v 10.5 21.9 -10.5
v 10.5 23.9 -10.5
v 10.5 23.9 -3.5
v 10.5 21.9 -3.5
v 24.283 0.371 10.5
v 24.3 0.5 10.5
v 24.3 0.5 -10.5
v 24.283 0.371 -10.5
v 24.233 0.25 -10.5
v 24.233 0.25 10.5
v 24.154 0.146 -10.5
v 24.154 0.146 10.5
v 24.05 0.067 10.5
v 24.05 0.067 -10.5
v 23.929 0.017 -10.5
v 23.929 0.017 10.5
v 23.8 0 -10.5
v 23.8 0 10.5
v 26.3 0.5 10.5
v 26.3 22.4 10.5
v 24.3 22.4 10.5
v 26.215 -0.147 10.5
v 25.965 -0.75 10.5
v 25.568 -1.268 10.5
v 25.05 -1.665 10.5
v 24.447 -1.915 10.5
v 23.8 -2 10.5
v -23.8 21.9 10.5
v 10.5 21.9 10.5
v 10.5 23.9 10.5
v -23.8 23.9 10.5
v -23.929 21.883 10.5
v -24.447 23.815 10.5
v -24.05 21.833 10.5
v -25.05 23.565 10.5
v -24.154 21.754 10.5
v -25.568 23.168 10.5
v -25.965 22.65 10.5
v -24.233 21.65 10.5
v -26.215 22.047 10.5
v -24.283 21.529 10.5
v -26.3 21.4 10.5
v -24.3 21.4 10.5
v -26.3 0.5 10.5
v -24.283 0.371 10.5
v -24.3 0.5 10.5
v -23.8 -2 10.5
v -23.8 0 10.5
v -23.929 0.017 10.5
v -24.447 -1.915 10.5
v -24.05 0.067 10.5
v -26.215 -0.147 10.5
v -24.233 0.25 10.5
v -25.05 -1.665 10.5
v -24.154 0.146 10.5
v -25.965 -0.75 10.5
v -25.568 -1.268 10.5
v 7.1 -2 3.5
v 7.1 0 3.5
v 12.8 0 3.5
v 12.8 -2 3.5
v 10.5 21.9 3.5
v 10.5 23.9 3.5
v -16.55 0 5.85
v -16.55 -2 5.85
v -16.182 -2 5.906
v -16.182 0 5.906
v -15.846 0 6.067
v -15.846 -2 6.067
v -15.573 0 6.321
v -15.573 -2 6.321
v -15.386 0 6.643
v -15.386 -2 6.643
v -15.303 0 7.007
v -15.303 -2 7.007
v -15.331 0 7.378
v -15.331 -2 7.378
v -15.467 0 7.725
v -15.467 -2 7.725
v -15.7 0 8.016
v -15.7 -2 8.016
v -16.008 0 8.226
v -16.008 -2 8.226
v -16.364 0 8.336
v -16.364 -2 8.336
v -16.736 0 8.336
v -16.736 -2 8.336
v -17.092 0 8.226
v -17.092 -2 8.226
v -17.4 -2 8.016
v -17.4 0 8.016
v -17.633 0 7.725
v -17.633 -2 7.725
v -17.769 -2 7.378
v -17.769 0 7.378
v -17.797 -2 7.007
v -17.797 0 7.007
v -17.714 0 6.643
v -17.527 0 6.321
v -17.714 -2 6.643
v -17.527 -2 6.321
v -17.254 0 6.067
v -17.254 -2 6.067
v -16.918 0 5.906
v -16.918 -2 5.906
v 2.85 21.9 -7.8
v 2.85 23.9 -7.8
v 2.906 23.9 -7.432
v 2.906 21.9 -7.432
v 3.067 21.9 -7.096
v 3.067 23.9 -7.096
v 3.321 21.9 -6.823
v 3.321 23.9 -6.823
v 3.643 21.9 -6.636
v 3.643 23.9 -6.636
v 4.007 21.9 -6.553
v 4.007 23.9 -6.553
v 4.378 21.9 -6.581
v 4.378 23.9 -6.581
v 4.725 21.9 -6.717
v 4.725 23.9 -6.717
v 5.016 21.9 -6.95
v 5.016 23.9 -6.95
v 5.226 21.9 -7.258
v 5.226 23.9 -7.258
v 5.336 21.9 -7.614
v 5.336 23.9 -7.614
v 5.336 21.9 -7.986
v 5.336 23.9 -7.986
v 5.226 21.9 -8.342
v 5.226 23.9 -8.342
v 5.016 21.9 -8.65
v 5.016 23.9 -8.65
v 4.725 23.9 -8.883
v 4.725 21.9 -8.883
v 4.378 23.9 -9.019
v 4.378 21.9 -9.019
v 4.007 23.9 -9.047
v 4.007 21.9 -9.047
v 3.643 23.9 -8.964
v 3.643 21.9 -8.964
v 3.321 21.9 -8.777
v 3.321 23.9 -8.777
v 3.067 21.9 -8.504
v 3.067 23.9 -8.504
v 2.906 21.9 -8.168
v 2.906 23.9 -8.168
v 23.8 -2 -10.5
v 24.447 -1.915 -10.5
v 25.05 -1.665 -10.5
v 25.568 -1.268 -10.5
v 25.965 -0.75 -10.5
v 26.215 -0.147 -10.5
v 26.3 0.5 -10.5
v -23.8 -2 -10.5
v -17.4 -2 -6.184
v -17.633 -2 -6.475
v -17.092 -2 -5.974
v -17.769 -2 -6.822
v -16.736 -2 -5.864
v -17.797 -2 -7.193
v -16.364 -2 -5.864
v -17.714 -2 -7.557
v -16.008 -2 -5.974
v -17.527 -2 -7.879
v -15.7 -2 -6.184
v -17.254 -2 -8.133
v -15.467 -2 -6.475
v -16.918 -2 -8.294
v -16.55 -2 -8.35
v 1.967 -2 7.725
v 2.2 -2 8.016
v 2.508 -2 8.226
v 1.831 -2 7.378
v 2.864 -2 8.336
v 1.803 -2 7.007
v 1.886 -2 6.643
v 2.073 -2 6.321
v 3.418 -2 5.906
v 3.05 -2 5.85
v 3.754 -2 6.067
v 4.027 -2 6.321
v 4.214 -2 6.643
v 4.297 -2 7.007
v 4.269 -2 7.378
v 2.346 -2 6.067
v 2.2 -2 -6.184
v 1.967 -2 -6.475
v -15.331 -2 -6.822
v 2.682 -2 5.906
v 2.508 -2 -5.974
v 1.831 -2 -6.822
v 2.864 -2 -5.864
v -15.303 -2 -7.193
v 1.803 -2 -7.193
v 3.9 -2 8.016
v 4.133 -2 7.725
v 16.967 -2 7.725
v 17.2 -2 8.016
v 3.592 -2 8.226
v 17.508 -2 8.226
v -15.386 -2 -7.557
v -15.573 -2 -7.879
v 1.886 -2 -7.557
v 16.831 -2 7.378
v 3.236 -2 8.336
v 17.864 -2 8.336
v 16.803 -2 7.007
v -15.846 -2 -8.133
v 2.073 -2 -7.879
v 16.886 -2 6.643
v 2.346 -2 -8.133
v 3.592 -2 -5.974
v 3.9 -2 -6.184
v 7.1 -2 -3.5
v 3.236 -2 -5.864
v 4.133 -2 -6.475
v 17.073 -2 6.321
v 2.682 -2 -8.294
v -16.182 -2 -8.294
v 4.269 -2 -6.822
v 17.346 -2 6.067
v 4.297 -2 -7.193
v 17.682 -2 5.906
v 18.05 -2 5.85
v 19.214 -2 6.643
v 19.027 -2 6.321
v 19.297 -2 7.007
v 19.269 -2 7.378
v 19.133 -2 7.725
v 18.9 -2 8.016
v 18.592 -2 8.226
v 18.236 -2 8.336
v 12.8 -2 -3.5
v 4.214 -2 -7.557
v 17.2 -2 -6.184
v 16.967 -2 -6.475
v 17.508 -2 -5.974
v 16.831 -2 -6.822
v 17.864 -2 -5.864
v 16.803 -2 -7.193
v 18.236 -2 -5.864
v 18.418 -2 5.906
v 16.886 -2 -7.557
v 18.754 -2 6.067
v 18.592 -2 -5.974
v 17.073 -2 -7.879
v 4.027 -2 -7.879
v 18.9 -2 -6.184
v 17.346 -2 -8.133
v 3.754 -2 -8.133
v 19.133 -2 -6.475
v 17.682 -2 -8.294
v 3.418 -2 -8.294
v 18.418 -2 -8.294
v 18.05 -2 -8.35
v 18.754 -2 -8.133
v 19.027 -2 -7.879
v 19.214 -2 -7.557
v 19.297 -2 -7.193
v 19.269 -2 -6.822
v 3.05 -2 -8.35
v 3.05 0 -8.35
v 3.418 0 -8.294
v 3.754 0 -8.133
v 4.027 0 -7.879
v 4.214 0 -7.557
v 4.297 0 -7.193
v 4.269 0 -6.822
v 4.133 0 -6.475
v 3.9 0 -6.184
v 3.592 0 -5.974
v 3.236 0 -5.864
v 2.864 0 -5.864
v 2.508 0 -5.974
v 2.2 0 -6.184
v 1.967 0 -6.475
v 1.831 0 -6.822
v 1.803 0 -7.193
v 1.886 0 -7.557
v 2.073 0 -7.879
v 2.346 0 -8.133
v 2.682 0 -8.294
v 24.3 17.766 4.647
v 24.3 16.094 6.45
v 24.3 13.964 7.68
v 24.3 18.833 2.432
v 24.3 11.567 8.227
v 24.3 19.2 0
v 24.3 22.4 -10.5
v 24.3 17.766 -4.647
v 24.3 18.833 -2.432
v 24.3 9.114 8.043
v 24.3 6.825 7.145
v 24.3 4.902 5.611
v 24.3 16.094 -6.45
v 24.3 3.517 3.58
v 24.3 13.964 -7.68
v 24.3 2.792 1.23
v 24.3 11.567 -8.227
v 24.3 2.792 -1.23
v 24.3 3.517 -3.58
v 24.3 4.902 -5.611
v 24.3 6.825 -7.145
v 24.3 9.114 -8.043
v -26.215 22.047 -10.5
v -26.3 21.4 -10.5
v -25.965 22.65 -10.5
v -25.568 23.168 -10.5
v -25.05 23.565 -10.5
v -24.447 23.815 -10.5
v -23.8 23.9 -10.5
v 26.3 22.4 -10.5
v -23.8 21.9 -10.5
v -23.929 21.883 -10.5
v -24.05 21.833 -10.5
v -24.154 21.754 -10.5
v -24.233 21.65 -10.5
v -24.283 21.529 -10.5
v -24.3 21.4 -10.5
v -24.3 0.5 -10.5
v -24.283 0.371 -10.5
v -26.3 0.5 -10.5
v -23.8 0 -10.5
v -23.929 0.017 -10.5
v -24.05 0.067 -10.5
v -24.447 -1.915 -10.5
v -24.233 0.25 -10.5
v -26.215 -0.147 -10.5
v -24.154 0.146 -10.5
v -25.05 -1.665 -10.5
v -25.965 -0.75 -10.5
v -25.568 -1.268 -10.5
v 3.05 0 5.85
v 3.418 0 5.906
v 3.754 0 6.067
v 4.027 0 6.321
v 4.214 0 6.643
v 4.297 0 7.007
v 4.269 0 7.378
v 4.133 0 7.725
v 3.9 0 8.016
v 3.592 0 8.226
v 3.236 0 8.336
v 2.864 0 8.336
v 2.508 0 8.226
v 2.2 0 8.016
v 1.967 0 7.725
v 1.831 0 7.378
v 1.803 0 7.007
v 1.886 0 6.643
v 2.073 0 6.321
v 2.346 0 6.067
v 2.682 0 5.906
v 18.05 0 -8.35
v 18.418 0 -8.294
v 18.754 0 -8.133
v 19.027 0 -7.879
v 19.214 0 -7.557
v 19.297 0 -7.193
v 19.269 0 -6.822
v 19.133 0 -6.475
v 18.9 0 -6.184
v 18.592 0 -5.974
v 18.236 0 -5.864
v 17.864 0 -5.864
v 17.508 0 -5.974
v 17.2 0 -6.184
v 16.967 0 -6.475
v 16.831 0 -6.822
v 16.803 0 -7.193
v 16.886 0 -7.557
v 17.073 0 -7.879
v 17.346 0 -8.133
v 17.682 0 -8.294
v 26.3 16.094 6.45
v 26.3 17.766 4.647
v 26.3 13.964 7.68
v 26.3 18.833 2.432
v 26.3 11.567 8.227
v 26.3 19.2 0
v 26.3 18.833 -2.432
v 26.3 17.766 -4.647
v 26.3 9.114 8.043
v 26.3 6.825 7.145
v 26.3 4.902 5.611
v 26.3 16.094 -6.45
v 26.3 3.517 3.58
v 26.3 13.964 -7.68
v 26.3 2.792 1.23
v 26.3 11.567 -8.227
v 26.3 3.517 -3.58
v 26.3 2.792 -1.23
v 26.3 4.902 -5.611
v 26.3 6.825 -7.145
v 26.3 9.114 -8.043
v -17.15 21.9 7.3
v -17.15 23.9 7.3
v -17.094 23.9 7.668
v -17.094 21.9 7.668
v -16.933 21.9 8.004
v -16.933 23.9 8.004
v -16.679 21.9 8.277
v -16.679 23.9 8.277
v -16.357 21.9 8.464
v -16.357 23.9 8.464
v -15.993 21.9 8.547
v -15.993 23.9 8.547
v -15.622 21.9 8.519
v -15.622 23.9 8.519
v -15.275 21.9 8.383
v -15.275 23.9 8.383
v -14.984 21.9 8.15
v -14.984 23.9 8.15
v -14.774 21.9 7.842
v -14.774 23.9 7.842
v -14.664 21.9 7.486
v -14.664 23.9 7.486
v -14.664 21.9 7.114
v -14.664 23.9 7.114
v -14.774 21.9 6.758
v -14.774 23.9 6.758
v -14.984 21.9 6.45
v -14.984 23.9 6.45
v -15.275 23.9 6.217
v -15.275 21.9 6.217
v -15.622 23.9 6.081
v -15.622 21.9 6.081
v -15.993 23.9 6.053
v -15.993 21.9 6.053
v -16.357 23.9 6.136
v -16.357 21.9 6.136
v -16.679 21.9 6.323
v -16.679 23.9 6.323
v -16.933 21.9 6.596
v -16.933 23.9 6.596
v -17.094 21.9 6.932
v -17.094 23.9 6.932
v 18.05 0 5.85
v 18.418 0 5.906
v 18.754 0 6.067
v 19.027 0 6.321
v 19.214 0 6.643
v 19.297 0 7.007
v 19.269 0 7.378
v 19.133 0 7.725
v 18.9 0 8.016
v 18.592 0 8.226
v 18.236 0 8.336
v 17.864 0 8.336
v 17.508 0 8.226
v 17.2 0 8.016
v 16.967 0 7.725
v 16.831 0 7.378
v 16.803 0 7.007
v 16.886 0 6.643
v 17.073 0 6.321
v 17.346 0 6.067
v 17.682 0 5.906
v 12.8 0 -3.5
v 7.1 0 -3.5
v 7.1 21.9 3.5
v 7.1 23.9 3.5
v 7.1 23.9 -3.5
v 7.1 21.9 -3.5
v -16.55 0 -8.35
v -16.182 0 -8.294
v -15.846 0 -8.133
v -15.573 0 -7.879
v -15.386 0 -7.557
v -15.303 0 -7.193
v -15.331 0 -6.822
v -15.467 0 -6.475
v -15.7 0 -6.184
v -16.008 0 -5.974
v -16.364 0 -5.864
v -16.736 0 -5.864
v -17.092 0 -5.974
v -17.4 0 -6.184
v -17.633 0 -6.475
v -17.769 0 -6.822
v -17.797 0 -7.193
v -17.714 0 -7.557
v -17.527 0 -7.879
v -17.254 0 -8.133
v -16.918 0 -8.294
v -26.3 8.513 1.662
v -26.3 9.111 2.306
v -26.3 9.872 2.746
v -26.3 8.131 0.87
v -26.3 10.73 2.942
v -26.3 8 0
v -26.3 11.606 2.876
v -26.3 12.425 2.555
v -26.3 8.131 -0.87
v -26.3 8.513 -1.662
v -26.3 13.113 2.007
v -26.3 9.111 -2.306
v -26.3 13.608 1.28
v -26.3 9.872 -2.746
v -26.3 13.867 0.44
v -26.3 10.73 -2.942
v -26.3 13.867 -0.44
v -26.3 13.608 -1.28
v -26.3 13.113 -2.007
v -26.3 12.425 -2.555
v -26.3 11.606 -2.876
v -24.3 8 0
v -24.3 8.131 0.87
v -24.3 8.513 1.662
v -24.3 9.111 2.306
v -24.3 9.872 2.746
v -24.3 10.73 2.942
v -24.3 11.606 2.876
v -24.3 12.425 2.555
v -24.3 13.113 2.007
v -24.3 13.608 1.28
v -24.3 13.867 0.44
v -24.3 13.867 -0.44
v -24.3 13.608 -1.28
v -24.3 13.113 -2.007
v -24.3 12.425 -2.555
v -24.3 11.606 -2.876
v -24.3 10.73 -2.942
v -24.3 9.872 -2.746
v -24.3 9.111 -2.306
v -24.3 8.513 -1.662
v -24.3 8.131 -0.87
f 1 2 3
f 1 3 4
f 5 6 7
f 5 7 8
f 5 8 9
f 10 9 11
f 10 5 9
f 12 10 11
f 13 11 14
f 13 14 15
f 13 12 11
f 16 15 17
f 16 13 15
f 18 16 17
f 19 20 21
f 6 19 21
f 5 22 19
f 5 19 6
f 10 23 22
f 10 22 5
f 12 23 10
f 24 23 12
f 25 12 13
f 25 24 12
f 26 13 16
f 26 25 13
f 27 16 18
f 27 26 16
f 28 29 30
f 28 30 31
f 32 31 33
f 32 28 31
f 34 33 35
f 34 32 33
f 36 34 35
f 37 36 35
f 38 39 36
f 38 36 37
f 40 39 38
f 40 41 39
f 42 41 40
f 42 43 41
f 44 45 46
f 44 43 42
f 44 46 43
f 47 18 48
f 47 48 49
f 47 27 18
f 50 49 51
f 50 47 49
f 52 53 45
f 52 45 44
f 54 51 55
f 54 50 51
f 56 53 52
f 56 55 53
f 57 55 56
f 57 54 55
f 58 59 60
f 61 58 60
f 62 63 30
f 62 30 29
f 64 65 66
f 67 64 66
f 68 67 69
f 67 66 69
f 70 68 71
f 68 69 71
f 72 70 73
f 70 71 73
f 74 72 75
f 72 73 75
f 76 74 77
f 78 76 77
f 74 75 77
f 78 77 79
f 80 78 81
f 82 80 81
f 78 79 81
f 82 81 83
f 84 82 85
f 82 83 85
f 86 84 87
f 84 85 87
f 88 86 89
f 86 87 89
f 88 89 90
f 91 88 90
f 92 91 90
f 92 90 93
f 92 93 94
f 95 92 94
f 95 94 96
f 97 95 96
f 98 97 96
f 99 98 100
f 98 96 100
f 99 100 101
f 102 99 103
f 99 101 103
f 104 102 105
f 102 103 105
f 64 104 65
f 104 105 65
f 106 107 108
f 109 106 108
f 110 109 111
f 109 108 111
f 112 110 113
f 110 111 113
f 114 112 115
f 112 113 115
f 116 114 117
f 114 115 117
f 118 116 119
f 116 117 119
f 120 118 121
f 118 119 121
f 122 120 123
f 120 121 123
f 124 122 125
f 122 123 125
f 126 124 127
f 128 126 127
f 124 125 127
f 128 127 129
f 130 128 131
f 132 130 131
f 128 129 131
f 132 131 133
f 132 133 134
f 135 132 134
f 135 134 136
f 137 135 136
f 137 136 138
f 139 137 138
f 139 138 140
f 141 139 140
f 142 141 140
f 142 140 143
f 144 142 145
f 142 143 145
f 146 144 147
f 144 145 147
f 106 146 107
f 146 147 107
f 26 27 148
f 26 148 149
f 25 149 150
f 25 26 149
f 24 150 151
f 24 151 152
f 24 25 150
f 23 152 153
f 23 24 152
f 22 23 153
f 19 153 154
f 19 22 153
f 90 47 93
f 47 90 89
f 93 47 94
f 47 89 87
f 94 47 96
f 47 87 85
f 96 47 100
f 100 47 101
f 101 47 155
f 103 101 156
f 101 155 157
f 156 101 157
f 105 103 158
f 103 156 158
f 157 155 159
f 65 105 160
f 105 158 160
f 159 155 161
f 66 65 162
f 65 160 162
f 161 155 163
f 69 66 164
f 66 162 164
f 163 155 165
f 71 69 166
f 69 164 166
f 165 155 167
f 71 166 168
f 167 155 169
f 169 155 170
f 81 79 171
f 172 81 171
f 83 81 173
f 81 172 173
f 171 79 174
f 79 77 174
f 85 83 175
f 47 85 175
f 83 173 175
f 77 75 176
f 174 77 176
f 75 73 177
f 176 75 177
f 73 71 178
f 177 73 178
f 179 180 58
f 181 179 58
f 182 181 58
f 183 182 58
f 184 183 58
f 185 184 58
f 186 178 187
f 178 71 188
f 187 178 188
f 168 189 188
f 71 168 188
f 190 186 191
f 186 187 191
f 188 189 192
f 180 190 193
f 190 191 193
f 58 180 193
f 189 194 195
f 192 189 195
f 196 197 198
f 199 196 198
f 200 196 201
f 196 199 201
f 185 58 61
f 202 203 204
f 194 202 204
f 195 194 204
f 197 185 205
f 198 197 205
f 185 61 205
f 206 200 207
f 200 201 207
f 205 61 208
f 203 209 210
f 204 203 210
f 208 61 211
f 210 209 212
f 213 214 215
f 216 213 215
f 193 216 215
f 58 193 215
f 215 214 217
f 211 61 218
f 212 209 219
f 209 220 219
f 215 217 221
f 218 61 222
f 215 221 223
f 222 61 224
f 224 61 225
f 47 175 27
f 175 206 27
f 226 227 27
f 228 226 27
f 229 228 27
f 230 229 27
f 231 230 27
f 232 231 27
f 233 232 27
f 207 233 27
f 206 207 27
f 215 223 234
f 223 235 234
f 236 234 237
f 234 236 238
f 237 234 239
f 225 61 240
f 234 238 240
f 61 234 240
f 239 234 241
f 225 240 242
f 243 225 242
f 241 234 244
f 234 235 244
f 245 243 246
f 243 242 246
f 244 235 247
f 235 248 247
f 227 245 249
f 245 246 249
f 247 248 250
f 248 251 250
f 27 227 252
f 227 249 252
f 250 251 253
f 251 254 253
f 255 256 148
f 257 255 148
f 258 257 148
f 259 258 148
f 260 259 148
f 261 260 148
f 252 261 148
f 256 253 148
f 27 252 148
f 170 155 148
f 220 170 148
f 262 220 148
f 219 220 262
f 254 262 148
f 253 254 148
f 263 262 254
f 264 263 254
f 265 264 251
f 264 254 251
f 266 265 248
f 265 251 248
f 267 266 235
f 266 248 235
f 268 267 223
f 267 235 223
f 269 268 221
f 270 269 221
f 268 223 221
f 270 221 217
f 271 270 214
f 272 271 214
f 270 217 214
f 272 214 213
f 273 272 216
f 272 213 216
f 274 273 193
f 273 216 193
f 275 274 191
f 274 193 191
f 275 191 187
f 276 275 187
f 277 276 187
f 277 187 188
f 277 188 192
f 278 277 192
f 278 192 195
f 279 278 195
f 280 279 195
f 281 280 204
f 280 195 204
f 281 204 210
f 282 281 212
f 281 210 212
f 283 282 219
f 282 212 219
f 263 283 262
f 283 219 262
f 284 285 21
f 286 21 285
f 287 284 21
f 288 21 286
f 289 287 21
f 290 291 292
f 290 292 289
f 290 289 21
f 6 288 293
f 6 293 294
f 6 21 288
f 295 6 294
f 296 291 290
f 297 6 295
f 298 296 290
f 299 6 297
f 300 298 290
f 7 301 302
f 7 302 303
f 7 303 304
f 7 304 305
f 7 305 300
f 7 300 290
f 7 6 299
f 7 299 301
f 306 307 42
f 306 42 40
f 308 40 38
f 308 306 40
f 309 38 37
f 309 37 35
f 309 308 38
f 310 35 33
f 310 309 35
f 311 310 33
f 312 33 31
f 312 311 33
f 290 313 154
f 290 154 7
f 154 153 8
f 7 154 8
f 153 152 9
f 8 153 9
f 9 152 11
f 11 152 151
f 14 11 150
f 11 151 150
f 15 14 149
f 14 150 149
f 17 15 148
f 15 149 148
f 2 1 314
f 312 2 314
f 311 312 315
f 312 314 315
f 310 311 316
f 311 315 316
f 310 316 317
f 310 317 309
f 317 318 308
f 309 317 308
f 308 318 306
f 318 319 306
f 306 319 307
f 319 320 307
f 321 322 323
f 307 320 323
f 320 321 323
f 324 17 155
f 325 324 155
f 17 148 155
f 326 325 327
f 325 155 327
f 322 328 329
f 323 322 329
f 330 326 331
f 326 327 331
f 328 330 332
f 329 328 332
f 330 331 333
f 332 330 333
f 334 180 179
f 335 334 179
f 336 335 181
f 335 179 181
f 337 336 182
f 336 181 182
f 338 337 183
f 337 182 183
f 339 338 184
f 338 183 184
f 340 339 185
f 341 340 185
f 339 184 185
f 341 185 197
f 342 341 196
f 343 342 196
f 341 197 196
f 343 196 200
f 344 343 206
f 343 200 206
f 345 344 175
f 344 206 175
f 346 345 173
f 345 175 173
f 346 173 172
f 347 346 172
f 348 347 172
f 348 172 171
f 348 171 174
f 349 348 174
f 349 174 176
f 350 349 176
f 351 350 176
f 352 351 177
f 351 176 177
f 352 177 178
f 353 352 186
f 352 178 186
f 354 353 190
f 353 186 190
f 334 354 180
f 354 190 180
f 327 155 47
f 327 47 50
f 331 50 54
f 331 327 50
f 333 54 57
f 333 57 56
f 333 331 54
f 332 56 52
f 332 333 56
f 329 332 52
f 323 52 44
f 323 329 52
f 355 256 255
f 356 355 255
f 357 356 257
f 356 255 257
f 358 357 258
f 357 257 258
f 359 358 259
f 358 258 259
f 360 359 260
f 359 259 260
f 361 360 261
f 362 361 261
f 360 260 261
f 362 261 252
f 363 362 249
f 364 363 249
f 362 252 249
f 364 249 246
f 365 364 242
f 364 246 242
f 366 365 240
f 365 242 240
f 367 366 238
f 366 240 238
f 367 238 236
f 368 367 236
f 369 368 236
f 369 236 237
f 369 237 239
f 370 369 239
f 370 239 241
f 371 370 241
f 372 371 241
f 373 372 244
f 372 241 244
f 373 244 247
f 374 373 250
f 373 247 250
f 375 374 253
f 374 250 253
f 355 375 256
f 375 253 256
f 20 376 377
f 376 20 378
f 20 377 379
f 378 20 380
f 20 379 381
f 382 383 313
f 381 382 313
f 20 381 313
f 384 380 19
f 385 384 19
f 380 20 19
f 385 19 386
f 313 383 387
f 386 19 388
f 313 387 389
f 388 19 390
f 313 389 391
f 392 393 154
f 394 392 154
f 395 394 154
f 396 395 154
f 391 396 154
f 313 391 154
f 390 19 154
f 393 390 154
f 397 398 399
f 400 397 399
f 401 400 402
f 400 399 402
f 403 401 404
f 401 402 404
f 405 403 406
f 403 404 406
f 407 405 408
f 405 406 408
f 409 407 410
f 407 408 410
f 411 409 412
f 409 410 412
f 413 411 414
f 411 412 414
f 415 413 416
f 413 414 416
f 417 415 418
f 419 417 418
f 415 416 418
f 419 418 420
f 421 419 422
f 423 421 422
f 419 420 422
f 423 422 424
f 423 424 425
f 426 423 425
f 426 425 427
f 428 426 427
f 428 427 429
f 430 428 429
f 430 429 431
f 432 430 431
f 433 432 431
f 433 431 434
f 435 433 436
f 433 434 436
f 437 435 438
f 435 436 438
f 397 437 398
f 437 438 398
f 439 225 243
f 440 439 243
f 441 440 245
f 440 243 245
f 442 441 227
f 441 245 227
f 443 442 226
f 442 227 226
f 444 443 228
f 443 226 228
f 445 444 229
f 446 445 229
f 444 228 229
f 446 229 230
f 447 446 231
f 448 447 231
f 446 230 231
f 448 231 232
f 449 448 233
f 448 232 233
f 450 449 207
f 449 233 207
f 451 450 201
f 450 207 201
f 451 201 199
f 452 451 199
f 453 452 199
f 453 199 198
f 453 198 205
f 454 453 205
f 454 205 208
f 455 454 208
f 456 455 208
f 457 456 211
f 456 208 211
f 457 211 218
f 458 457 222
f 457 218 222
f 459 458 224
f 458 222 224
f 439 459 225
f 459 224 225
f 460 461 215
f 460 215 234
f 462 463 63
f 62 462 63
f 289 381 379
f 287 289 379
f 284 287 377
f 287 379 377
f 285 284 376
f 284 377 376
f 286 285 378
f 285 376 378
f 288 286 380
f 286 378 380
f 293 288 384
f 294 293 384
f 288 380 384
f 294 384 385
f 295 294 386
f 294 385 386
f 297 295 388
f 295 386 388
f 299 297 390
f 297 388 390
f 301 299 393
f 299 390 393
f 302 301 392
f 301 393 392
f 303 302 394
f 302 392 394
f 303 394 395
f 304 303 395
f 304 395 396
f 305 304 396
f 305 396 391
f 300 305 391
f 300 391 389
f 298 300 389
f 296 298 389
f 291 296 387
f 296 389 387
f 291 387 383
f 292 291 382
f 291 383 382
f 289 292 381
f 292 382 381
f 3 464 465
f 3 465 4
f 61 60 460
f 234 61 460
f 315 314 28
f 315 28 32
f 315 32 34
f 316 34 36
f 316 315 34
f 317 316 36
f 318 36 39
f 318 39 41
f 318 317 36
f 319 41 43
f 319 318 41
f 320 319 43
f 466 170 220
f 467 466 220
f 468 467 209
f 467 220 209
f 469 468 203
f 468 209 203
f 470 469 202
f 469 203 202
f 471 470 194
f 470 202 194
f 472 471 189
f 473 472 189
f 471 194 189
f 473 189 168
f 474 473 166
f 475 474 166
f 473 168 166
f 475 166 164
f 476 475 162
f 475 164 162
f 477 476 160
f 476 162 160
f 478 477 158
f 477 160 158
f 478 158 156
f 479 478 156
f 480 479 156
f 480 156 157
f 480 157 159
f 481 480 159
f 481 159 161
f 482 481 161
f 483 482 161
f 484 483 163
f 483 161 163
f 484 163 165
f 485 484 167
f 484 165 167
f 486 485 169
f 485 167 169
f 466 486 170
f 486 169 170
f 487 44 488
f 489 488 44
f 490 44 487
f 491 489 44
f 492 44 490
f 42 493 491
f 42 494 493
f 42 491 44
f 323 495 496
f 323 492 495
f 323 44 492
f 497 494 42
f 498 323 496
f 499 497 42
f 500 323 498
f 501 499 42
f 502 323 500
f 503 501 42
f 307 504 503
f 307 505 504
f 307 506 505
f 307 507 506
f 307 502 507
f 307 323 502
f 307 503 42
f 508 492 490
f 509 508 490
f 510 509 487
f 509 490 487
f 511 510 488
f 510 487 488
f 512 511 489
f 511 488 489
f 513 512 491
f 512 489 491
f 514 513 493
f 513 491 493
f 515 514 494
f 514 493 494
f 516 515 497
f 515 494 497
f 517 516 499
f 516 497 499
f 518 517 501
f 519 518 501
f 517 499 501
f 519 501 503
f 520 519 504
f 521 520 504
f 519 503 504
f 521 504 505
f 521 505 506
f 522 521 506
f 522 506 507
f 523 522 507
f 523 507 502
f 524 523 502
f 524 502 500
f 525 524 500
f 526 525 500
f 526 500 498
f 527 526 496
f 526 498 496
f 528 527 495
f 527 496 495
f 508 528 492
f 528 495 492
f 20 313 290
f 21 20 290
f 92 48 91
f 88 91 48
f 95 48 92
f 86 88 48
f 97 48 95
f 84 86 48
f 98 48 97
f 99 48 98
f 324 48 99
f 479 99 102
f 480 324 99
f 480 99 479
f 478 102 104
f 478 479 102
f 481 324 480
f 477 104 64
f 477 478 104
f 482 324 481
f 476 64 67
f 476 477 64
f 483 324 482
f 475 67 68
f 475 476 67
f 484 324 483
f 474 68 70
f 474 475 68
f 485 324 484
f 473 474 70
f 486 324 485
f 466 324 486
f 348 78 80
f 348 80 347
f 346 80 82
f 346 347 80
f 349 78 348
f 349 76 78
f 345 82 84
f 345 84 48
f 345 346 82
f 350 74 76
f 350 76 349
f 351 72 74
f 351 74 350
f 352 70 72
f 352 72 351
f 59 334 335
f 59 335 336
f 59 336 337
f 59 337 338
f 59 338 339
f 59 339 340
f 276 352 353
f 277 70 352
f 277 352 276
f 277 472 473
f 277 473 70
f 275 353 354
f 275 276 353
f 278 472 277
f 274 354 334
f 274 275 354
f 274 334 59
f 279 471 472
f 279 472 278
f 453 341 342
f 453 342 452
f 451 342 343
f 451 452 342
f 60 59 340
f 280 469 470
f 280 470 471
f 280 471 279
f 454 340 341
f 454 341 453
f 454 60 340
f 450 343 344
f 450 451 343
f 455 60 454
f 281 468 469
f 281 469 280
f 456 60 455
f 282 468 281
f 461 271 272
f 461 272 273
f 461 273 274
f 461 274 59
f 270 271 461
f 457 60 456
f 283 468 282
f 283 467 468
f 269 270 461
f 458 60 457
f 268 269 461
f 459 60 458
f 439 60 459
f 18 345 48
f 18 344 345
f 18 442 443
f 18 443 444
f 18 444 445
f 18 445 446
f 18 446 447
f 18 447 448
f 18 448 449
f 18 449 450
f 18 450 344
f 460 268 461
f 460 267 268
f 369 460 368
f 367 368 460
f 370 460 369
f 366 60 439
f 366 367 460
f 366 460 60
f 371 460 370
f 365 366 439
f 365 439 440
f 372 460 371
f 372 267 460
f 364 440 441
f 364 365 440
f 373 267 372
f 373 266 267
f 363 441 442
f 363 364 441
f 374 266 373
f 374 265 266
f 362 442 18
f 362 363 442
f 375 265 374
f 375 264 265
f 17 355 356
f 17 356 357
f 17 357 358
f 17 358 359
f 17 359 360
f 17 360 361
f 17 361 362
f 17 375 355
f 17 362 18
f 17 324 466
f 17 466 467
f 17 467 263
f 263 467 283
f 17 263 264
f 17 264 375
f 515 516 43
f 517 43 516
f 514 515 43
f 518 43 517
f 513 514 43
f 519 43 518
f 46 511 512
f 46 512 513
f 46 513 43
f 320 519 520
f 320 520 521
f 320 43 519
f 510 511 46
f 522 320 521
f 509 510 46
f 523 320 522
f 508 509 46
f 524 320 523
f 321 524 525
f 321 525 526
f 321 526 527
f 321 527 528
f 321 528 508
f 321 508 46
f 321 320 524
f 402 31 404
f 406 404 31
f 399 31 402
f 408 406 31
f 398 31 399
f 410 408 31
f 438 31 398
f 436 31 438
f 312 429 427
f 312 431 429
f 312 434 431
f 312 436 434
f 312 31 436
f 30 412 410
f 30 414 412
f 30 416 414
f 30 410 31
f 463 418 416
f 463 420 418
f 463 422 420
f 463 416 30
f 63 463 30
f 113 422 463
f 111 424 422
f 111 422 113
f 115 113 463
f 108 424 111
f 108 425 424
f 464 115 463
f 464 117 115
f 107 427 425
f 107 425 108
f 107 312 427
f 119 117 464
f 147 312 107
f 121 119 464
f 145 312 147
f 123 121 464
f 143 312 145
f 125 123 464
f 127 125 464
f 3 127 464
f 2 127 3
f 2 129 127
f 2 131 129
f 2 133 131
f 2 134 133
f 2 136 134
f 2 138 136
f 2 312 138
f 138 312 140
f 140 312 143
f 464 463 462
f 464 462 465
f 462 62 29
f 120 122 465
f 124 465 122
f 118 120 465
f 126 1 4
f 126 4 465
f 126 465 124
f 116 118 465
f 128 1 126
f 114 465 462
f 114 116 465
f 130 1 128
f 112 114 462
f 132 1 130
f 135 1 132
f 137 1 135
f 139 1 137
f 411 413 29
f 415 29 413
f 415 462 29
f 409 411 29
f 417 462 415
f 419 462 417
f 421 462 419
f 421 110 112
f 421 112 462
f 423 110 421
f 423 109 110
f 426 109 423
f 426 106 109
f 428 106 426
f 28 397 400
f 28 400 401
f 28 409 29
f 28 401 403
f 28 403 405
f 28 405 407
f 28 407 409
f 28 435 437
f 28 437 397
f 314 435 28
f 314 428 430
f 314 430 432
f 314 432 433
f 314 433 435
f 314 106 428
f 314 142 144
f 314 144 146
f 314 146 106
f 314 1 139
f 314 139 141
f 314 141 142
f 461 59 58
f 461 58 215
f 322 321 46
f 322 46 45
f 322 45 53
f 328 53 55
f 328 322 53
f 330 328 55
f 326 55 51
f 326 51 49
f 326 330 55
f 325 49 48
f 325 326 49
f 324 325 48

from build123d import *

# Parameters (mm, degrees)
SKETCH1_W                    = 52.6
SKETCH1_H                    = 21
BASE_FLANGE1_DEPTH           = 2
EDGE_FLANGE1_STRIP_W         = 9
EDGE_FLANGE1_STRIP_H         = 2
EDGE_FLANGE1_STRIP_CUT_DEPTH = 21
EDGE_FLANGE1_DEPTH           = 21
EDGE_FLANGE2_STRIP_W         = 9
EDGE_FLANGE2_STRIP_H         = 2
EDGE_FLANGE2_STRIP_CUT_DEPTH = 21
EDGE_FLANGE2_DEPTH           = 21
EDGE_FLANGE3_STRIP_W         = 9
EDGE_FLANGE3_STRIP_H         = 2
EDGE_FLANGE3_STRIP_CUT_DEPTH = 21
EDGE_FLANGE3_DEPTH           = 21
SKETCH15_W                   = 3.4
SKETCH15_H                   = 7
CUT_EXTRUDE1_DEPTH           = 10
SKETCH16_R                   = 1.25
CUT_EXTRUDE2_DEPTH           = 2
SKETCH18_W                   = 5.7
SKETCH18_H                   = 7
CUT_EXTRUDE3_DEPTH           = 39.376425055
SKETCH19_R                   = 2.95
CUT_EXTRUDE4_DEPTH           = 2
SKETCH20_R                   = 1.25
CUT_EXTRUDE5_DEPTH           = 2
SKETCH21_R                   = 8.25
CUT_EXTRUDE6_DEPTH           = 2
MOVE_FACE1_BY                = 0.8


# Sheet-metal steps are written as plain solids
with BuildPart() as part:
    # Sketch1 → Base-Flange1 (new body)
    with BuildSketch(Plane(origin=(0, 0, 0), x_dir=(1, 0, 0), z_dir=(0, 1, 0))):
        Rectangle(SKETCH1_W, SKETCH1_H)
    extrude(amount=-BASE_FLANGE1_DEPTH)

    # Edge-Flange1 strip (across the edge) → Edge-Flange1 strip cut (cut)
    with BuildSketch(Plane(origin=(-26.3, 0, -10.5), x_dir=(1, 0, 0), z_dir=(0, 0, 1))):
        with Locations((-2, -1)):
            Rectangle(EDGE_FLANGE1_STRIP_W, EDGE_FLANGE1_STRIP_H)
    extrude(amount=EDGE_FLANGE1_STRIP_CUT_DEPTH, mode=Mode.SUBTRACT)

    # Edge-Flange1 section (across the edge) → Edge-Flange1 (add)
    with BuildSketch(Plane(origin=(-26.3, 0, -10.5), x_dir=(1, 0, 0), z_dir=(0, 0, 1))):
        with BuildLine():
            Line((0, 0.5), (0, 23.9))
            Line((0, 23.9), (2, 23.9))
            Line((2, 23.9), (2, 0.5))
            ThreePointArc((2, 0.5), (2.146446609, 0.146446609), (2.5, 0))
            Line((2.5, 0), (2.5, -2))
            ThreePointArc((2.5, -2), (0.732233047, -1.267766953), (0, 0.5))
        make_face()
    extrude(amount=EDGE_FLANGE1_DEPTH)

    # Edge-Flange2 strip (across the edge) → Edge-Flange2 strip cut (cut)
    with BuildSketch(Plane(origin=(-24.3, 23.9, -10.5), x_dir=(0, -1, 0), z_dir=(0, 0, 1))):
        with Locations((-2, -1)):
            Rectangle(EDGE_FLANGE2_STRIP_W, EDGE_FLANGE2_STRIP_H)
    extrude(amount=EDGE_FLANGE2_STRIP_CUT_DEPTH, mode=Mode.SUBTRACT)

    # Edge-Flange2 section (across the edge) → Edge-Flange2 (add)
    with BuildSketch(Plane(origin=(-24.3, 23.9, -10.5), x_dir=(0, -1, 0), z_dir=(0, 0, 1))):
        with BuildLine():
            Line((0, 0.5), (0, 34.8))
            Line((0, 34.8), (2, 34.8))
            Line((2, 34.8), (2, 0.5))
            ThreePointArc((2, 0.5), (2.146446609, 0.146446609), (2.5, 0))
            Line((2.5, 0), (2.5, -2))
            ThreePointArc((2.5, -2), (0.732233047, -1.267766953), (0, 0.5))
        make_face()
    extrude(amount=EDGE_FLANGE2_DEPTH)

    # Edge-Flange3 strip (across the edge) → Edge-Flange3 strip cut (cut)
    with BuildSketch(Plane(origin=(26.3, 0, 10.5), x_dir=(-1, 0, 0), z_dir=(0, 0, -1))):
        with Locations((-2, -1)):
            Rectangle(EDGE_FLANGE3_STRIP_W, EDGE_FLANGE3_STRIP_H)
    extrude(amount=EDGE_FLANGE3_STRIP_CUT_DEPTH, mode=Mode.SUBTRACT)

    # Edge-Flange3 section (across the edge) → Edge-Flange3 (add)
    with BuildSketch(Plane(origin=(26.3, 0, 10.5), x_dir=(-1, 0, 0), z_dir=(0, 0, -1))):
        with BuildLine():
            Line((0, 0.5), (0, 21.6))
            Line((0, 21.6), (2, 21.6))
            Line((2, 21.6), (2, 0.5))
            ThreePointArc((2, 0.5), (2.146446609, 0.146446609), (2.5, 0))
            Line((2.5, 0), (2.5, -2))
            ThreePointArc((2.5, -2), (0.732233047, -1.267766953), (0, 0.5))
        make_face()
    extrude(amount=EDGE_FLANGE3_DEPTH)

    # Sketch15 → Cut-Extrude1 (cut)
    with BuildSketch(Plane(origin=(0, 23.9, 0), x_dir=(1, 0, 0), z_dir=(0, 1, 0))):
        with Locations((8.8, 0)):
            Rectangle(SKETCH15_W, SKETCH15_H)
    extrude(amount=-CUT_EXTRUDE1_DEPTH, mode=Mode.SUBTRACT)

    # Sketch16 → Cut-Extrude2 (cut)
    with BuildSketch(Plane(origin=(0, 23.9, 0), x_dir=(1, 0, 0), z_dir=(0, 1, 0))):
        with Locations(Location((4.1, 7.8, 0), (0, 0, 180))):
            Circle(SKETCH16_R)
        with Locations(Location((-15.9, -7.3, 0), (0, 0, 180))):
            Circle(SKETCH16_R)
    extrude(amount=-CUT_EXTRUDE2_DEPTH, mode=Mode.SUBTRACT)

    # Sketch18 → Cut-Extrude3 (cut, through all)
    with BuildSketch(Plane(origin=(0, 23.9, 0), x_dir=(1, 0, 0), z_dir=(0, 1, 0))):
        with Locations((9.95, 0)):
            Rectangle(SKETCH18_W, SKETCH18_H)
    extrude(amount=-CUT_EXTRUDE3_DEPTH, mode=Mode.SUBTRACT)

    # Sketch19 → Cut-Extrude4 (cut)
    with BuildSketch(Plane.ZY.offset(26.3)):
        with Locations(Location((0, 10.95, 0), (0, 0, 270))):
            Circle(SKETCH19_R)
    extrude(amount=-CUT_EXTRUDE4_DEPTH, mode=Mode.SUBTRACT)

    # Sketch20 → Cut-Extrude5 (cut)
    with BuildSketch(Plane.XZ.offset(2)):
        with Locations(Location((-16.55, 7.1, 0), (0, 0, 270))):
            Circle(SKETCH20_R)
        with Locations(Location((3.05, 7.1, 0), (0, 0, 270))):
            Circle(SKETCH20_R)
        with Locations(Location((18.05, 7.1, 0), (0, 0, 270))):
            Circle(SKETCH20_R)
        with Locations(Location((-16.55, -7.1, 0), (0, 0, 270))):
            Circle(SKETCH20_R)
        with Locations(Location((3.05, -7.1, 0), (0, 0, 270))):
            Circle(SKETCH20_R)
        with Locations(Location((18.05, -7.1, 0), (0, 0, 270))):
            Circle(SKETCH20_R)
    extrude(amount=-CUT_EXTRUDE5_DEPTH, mode=Mode.SUBTRACT)

    # Sketch21 → Cut-Extrude6 (cut)
    with BuildSketch(Plane(origin=(26.3, 0, 0), x_dir=(0, 0, -1), z_dir=(1, 0, 0))):
        with Locations(Location((0, 10.95, 0), (0, 0, 90))):
            Circle(SKETCH21_R)
    extrude(amount=-CUT_EXTRUDE6_DEPTH, mode=Mode.SUBTRACT)

    # Move Face1: a face moved outward by 0.8
    extrude(part.faces().sort_by_distance((25.3, 21.6, 0))[0], amount=MOVE_FACE1_BY, dir=(0, 1, 0))


solid = part.part
